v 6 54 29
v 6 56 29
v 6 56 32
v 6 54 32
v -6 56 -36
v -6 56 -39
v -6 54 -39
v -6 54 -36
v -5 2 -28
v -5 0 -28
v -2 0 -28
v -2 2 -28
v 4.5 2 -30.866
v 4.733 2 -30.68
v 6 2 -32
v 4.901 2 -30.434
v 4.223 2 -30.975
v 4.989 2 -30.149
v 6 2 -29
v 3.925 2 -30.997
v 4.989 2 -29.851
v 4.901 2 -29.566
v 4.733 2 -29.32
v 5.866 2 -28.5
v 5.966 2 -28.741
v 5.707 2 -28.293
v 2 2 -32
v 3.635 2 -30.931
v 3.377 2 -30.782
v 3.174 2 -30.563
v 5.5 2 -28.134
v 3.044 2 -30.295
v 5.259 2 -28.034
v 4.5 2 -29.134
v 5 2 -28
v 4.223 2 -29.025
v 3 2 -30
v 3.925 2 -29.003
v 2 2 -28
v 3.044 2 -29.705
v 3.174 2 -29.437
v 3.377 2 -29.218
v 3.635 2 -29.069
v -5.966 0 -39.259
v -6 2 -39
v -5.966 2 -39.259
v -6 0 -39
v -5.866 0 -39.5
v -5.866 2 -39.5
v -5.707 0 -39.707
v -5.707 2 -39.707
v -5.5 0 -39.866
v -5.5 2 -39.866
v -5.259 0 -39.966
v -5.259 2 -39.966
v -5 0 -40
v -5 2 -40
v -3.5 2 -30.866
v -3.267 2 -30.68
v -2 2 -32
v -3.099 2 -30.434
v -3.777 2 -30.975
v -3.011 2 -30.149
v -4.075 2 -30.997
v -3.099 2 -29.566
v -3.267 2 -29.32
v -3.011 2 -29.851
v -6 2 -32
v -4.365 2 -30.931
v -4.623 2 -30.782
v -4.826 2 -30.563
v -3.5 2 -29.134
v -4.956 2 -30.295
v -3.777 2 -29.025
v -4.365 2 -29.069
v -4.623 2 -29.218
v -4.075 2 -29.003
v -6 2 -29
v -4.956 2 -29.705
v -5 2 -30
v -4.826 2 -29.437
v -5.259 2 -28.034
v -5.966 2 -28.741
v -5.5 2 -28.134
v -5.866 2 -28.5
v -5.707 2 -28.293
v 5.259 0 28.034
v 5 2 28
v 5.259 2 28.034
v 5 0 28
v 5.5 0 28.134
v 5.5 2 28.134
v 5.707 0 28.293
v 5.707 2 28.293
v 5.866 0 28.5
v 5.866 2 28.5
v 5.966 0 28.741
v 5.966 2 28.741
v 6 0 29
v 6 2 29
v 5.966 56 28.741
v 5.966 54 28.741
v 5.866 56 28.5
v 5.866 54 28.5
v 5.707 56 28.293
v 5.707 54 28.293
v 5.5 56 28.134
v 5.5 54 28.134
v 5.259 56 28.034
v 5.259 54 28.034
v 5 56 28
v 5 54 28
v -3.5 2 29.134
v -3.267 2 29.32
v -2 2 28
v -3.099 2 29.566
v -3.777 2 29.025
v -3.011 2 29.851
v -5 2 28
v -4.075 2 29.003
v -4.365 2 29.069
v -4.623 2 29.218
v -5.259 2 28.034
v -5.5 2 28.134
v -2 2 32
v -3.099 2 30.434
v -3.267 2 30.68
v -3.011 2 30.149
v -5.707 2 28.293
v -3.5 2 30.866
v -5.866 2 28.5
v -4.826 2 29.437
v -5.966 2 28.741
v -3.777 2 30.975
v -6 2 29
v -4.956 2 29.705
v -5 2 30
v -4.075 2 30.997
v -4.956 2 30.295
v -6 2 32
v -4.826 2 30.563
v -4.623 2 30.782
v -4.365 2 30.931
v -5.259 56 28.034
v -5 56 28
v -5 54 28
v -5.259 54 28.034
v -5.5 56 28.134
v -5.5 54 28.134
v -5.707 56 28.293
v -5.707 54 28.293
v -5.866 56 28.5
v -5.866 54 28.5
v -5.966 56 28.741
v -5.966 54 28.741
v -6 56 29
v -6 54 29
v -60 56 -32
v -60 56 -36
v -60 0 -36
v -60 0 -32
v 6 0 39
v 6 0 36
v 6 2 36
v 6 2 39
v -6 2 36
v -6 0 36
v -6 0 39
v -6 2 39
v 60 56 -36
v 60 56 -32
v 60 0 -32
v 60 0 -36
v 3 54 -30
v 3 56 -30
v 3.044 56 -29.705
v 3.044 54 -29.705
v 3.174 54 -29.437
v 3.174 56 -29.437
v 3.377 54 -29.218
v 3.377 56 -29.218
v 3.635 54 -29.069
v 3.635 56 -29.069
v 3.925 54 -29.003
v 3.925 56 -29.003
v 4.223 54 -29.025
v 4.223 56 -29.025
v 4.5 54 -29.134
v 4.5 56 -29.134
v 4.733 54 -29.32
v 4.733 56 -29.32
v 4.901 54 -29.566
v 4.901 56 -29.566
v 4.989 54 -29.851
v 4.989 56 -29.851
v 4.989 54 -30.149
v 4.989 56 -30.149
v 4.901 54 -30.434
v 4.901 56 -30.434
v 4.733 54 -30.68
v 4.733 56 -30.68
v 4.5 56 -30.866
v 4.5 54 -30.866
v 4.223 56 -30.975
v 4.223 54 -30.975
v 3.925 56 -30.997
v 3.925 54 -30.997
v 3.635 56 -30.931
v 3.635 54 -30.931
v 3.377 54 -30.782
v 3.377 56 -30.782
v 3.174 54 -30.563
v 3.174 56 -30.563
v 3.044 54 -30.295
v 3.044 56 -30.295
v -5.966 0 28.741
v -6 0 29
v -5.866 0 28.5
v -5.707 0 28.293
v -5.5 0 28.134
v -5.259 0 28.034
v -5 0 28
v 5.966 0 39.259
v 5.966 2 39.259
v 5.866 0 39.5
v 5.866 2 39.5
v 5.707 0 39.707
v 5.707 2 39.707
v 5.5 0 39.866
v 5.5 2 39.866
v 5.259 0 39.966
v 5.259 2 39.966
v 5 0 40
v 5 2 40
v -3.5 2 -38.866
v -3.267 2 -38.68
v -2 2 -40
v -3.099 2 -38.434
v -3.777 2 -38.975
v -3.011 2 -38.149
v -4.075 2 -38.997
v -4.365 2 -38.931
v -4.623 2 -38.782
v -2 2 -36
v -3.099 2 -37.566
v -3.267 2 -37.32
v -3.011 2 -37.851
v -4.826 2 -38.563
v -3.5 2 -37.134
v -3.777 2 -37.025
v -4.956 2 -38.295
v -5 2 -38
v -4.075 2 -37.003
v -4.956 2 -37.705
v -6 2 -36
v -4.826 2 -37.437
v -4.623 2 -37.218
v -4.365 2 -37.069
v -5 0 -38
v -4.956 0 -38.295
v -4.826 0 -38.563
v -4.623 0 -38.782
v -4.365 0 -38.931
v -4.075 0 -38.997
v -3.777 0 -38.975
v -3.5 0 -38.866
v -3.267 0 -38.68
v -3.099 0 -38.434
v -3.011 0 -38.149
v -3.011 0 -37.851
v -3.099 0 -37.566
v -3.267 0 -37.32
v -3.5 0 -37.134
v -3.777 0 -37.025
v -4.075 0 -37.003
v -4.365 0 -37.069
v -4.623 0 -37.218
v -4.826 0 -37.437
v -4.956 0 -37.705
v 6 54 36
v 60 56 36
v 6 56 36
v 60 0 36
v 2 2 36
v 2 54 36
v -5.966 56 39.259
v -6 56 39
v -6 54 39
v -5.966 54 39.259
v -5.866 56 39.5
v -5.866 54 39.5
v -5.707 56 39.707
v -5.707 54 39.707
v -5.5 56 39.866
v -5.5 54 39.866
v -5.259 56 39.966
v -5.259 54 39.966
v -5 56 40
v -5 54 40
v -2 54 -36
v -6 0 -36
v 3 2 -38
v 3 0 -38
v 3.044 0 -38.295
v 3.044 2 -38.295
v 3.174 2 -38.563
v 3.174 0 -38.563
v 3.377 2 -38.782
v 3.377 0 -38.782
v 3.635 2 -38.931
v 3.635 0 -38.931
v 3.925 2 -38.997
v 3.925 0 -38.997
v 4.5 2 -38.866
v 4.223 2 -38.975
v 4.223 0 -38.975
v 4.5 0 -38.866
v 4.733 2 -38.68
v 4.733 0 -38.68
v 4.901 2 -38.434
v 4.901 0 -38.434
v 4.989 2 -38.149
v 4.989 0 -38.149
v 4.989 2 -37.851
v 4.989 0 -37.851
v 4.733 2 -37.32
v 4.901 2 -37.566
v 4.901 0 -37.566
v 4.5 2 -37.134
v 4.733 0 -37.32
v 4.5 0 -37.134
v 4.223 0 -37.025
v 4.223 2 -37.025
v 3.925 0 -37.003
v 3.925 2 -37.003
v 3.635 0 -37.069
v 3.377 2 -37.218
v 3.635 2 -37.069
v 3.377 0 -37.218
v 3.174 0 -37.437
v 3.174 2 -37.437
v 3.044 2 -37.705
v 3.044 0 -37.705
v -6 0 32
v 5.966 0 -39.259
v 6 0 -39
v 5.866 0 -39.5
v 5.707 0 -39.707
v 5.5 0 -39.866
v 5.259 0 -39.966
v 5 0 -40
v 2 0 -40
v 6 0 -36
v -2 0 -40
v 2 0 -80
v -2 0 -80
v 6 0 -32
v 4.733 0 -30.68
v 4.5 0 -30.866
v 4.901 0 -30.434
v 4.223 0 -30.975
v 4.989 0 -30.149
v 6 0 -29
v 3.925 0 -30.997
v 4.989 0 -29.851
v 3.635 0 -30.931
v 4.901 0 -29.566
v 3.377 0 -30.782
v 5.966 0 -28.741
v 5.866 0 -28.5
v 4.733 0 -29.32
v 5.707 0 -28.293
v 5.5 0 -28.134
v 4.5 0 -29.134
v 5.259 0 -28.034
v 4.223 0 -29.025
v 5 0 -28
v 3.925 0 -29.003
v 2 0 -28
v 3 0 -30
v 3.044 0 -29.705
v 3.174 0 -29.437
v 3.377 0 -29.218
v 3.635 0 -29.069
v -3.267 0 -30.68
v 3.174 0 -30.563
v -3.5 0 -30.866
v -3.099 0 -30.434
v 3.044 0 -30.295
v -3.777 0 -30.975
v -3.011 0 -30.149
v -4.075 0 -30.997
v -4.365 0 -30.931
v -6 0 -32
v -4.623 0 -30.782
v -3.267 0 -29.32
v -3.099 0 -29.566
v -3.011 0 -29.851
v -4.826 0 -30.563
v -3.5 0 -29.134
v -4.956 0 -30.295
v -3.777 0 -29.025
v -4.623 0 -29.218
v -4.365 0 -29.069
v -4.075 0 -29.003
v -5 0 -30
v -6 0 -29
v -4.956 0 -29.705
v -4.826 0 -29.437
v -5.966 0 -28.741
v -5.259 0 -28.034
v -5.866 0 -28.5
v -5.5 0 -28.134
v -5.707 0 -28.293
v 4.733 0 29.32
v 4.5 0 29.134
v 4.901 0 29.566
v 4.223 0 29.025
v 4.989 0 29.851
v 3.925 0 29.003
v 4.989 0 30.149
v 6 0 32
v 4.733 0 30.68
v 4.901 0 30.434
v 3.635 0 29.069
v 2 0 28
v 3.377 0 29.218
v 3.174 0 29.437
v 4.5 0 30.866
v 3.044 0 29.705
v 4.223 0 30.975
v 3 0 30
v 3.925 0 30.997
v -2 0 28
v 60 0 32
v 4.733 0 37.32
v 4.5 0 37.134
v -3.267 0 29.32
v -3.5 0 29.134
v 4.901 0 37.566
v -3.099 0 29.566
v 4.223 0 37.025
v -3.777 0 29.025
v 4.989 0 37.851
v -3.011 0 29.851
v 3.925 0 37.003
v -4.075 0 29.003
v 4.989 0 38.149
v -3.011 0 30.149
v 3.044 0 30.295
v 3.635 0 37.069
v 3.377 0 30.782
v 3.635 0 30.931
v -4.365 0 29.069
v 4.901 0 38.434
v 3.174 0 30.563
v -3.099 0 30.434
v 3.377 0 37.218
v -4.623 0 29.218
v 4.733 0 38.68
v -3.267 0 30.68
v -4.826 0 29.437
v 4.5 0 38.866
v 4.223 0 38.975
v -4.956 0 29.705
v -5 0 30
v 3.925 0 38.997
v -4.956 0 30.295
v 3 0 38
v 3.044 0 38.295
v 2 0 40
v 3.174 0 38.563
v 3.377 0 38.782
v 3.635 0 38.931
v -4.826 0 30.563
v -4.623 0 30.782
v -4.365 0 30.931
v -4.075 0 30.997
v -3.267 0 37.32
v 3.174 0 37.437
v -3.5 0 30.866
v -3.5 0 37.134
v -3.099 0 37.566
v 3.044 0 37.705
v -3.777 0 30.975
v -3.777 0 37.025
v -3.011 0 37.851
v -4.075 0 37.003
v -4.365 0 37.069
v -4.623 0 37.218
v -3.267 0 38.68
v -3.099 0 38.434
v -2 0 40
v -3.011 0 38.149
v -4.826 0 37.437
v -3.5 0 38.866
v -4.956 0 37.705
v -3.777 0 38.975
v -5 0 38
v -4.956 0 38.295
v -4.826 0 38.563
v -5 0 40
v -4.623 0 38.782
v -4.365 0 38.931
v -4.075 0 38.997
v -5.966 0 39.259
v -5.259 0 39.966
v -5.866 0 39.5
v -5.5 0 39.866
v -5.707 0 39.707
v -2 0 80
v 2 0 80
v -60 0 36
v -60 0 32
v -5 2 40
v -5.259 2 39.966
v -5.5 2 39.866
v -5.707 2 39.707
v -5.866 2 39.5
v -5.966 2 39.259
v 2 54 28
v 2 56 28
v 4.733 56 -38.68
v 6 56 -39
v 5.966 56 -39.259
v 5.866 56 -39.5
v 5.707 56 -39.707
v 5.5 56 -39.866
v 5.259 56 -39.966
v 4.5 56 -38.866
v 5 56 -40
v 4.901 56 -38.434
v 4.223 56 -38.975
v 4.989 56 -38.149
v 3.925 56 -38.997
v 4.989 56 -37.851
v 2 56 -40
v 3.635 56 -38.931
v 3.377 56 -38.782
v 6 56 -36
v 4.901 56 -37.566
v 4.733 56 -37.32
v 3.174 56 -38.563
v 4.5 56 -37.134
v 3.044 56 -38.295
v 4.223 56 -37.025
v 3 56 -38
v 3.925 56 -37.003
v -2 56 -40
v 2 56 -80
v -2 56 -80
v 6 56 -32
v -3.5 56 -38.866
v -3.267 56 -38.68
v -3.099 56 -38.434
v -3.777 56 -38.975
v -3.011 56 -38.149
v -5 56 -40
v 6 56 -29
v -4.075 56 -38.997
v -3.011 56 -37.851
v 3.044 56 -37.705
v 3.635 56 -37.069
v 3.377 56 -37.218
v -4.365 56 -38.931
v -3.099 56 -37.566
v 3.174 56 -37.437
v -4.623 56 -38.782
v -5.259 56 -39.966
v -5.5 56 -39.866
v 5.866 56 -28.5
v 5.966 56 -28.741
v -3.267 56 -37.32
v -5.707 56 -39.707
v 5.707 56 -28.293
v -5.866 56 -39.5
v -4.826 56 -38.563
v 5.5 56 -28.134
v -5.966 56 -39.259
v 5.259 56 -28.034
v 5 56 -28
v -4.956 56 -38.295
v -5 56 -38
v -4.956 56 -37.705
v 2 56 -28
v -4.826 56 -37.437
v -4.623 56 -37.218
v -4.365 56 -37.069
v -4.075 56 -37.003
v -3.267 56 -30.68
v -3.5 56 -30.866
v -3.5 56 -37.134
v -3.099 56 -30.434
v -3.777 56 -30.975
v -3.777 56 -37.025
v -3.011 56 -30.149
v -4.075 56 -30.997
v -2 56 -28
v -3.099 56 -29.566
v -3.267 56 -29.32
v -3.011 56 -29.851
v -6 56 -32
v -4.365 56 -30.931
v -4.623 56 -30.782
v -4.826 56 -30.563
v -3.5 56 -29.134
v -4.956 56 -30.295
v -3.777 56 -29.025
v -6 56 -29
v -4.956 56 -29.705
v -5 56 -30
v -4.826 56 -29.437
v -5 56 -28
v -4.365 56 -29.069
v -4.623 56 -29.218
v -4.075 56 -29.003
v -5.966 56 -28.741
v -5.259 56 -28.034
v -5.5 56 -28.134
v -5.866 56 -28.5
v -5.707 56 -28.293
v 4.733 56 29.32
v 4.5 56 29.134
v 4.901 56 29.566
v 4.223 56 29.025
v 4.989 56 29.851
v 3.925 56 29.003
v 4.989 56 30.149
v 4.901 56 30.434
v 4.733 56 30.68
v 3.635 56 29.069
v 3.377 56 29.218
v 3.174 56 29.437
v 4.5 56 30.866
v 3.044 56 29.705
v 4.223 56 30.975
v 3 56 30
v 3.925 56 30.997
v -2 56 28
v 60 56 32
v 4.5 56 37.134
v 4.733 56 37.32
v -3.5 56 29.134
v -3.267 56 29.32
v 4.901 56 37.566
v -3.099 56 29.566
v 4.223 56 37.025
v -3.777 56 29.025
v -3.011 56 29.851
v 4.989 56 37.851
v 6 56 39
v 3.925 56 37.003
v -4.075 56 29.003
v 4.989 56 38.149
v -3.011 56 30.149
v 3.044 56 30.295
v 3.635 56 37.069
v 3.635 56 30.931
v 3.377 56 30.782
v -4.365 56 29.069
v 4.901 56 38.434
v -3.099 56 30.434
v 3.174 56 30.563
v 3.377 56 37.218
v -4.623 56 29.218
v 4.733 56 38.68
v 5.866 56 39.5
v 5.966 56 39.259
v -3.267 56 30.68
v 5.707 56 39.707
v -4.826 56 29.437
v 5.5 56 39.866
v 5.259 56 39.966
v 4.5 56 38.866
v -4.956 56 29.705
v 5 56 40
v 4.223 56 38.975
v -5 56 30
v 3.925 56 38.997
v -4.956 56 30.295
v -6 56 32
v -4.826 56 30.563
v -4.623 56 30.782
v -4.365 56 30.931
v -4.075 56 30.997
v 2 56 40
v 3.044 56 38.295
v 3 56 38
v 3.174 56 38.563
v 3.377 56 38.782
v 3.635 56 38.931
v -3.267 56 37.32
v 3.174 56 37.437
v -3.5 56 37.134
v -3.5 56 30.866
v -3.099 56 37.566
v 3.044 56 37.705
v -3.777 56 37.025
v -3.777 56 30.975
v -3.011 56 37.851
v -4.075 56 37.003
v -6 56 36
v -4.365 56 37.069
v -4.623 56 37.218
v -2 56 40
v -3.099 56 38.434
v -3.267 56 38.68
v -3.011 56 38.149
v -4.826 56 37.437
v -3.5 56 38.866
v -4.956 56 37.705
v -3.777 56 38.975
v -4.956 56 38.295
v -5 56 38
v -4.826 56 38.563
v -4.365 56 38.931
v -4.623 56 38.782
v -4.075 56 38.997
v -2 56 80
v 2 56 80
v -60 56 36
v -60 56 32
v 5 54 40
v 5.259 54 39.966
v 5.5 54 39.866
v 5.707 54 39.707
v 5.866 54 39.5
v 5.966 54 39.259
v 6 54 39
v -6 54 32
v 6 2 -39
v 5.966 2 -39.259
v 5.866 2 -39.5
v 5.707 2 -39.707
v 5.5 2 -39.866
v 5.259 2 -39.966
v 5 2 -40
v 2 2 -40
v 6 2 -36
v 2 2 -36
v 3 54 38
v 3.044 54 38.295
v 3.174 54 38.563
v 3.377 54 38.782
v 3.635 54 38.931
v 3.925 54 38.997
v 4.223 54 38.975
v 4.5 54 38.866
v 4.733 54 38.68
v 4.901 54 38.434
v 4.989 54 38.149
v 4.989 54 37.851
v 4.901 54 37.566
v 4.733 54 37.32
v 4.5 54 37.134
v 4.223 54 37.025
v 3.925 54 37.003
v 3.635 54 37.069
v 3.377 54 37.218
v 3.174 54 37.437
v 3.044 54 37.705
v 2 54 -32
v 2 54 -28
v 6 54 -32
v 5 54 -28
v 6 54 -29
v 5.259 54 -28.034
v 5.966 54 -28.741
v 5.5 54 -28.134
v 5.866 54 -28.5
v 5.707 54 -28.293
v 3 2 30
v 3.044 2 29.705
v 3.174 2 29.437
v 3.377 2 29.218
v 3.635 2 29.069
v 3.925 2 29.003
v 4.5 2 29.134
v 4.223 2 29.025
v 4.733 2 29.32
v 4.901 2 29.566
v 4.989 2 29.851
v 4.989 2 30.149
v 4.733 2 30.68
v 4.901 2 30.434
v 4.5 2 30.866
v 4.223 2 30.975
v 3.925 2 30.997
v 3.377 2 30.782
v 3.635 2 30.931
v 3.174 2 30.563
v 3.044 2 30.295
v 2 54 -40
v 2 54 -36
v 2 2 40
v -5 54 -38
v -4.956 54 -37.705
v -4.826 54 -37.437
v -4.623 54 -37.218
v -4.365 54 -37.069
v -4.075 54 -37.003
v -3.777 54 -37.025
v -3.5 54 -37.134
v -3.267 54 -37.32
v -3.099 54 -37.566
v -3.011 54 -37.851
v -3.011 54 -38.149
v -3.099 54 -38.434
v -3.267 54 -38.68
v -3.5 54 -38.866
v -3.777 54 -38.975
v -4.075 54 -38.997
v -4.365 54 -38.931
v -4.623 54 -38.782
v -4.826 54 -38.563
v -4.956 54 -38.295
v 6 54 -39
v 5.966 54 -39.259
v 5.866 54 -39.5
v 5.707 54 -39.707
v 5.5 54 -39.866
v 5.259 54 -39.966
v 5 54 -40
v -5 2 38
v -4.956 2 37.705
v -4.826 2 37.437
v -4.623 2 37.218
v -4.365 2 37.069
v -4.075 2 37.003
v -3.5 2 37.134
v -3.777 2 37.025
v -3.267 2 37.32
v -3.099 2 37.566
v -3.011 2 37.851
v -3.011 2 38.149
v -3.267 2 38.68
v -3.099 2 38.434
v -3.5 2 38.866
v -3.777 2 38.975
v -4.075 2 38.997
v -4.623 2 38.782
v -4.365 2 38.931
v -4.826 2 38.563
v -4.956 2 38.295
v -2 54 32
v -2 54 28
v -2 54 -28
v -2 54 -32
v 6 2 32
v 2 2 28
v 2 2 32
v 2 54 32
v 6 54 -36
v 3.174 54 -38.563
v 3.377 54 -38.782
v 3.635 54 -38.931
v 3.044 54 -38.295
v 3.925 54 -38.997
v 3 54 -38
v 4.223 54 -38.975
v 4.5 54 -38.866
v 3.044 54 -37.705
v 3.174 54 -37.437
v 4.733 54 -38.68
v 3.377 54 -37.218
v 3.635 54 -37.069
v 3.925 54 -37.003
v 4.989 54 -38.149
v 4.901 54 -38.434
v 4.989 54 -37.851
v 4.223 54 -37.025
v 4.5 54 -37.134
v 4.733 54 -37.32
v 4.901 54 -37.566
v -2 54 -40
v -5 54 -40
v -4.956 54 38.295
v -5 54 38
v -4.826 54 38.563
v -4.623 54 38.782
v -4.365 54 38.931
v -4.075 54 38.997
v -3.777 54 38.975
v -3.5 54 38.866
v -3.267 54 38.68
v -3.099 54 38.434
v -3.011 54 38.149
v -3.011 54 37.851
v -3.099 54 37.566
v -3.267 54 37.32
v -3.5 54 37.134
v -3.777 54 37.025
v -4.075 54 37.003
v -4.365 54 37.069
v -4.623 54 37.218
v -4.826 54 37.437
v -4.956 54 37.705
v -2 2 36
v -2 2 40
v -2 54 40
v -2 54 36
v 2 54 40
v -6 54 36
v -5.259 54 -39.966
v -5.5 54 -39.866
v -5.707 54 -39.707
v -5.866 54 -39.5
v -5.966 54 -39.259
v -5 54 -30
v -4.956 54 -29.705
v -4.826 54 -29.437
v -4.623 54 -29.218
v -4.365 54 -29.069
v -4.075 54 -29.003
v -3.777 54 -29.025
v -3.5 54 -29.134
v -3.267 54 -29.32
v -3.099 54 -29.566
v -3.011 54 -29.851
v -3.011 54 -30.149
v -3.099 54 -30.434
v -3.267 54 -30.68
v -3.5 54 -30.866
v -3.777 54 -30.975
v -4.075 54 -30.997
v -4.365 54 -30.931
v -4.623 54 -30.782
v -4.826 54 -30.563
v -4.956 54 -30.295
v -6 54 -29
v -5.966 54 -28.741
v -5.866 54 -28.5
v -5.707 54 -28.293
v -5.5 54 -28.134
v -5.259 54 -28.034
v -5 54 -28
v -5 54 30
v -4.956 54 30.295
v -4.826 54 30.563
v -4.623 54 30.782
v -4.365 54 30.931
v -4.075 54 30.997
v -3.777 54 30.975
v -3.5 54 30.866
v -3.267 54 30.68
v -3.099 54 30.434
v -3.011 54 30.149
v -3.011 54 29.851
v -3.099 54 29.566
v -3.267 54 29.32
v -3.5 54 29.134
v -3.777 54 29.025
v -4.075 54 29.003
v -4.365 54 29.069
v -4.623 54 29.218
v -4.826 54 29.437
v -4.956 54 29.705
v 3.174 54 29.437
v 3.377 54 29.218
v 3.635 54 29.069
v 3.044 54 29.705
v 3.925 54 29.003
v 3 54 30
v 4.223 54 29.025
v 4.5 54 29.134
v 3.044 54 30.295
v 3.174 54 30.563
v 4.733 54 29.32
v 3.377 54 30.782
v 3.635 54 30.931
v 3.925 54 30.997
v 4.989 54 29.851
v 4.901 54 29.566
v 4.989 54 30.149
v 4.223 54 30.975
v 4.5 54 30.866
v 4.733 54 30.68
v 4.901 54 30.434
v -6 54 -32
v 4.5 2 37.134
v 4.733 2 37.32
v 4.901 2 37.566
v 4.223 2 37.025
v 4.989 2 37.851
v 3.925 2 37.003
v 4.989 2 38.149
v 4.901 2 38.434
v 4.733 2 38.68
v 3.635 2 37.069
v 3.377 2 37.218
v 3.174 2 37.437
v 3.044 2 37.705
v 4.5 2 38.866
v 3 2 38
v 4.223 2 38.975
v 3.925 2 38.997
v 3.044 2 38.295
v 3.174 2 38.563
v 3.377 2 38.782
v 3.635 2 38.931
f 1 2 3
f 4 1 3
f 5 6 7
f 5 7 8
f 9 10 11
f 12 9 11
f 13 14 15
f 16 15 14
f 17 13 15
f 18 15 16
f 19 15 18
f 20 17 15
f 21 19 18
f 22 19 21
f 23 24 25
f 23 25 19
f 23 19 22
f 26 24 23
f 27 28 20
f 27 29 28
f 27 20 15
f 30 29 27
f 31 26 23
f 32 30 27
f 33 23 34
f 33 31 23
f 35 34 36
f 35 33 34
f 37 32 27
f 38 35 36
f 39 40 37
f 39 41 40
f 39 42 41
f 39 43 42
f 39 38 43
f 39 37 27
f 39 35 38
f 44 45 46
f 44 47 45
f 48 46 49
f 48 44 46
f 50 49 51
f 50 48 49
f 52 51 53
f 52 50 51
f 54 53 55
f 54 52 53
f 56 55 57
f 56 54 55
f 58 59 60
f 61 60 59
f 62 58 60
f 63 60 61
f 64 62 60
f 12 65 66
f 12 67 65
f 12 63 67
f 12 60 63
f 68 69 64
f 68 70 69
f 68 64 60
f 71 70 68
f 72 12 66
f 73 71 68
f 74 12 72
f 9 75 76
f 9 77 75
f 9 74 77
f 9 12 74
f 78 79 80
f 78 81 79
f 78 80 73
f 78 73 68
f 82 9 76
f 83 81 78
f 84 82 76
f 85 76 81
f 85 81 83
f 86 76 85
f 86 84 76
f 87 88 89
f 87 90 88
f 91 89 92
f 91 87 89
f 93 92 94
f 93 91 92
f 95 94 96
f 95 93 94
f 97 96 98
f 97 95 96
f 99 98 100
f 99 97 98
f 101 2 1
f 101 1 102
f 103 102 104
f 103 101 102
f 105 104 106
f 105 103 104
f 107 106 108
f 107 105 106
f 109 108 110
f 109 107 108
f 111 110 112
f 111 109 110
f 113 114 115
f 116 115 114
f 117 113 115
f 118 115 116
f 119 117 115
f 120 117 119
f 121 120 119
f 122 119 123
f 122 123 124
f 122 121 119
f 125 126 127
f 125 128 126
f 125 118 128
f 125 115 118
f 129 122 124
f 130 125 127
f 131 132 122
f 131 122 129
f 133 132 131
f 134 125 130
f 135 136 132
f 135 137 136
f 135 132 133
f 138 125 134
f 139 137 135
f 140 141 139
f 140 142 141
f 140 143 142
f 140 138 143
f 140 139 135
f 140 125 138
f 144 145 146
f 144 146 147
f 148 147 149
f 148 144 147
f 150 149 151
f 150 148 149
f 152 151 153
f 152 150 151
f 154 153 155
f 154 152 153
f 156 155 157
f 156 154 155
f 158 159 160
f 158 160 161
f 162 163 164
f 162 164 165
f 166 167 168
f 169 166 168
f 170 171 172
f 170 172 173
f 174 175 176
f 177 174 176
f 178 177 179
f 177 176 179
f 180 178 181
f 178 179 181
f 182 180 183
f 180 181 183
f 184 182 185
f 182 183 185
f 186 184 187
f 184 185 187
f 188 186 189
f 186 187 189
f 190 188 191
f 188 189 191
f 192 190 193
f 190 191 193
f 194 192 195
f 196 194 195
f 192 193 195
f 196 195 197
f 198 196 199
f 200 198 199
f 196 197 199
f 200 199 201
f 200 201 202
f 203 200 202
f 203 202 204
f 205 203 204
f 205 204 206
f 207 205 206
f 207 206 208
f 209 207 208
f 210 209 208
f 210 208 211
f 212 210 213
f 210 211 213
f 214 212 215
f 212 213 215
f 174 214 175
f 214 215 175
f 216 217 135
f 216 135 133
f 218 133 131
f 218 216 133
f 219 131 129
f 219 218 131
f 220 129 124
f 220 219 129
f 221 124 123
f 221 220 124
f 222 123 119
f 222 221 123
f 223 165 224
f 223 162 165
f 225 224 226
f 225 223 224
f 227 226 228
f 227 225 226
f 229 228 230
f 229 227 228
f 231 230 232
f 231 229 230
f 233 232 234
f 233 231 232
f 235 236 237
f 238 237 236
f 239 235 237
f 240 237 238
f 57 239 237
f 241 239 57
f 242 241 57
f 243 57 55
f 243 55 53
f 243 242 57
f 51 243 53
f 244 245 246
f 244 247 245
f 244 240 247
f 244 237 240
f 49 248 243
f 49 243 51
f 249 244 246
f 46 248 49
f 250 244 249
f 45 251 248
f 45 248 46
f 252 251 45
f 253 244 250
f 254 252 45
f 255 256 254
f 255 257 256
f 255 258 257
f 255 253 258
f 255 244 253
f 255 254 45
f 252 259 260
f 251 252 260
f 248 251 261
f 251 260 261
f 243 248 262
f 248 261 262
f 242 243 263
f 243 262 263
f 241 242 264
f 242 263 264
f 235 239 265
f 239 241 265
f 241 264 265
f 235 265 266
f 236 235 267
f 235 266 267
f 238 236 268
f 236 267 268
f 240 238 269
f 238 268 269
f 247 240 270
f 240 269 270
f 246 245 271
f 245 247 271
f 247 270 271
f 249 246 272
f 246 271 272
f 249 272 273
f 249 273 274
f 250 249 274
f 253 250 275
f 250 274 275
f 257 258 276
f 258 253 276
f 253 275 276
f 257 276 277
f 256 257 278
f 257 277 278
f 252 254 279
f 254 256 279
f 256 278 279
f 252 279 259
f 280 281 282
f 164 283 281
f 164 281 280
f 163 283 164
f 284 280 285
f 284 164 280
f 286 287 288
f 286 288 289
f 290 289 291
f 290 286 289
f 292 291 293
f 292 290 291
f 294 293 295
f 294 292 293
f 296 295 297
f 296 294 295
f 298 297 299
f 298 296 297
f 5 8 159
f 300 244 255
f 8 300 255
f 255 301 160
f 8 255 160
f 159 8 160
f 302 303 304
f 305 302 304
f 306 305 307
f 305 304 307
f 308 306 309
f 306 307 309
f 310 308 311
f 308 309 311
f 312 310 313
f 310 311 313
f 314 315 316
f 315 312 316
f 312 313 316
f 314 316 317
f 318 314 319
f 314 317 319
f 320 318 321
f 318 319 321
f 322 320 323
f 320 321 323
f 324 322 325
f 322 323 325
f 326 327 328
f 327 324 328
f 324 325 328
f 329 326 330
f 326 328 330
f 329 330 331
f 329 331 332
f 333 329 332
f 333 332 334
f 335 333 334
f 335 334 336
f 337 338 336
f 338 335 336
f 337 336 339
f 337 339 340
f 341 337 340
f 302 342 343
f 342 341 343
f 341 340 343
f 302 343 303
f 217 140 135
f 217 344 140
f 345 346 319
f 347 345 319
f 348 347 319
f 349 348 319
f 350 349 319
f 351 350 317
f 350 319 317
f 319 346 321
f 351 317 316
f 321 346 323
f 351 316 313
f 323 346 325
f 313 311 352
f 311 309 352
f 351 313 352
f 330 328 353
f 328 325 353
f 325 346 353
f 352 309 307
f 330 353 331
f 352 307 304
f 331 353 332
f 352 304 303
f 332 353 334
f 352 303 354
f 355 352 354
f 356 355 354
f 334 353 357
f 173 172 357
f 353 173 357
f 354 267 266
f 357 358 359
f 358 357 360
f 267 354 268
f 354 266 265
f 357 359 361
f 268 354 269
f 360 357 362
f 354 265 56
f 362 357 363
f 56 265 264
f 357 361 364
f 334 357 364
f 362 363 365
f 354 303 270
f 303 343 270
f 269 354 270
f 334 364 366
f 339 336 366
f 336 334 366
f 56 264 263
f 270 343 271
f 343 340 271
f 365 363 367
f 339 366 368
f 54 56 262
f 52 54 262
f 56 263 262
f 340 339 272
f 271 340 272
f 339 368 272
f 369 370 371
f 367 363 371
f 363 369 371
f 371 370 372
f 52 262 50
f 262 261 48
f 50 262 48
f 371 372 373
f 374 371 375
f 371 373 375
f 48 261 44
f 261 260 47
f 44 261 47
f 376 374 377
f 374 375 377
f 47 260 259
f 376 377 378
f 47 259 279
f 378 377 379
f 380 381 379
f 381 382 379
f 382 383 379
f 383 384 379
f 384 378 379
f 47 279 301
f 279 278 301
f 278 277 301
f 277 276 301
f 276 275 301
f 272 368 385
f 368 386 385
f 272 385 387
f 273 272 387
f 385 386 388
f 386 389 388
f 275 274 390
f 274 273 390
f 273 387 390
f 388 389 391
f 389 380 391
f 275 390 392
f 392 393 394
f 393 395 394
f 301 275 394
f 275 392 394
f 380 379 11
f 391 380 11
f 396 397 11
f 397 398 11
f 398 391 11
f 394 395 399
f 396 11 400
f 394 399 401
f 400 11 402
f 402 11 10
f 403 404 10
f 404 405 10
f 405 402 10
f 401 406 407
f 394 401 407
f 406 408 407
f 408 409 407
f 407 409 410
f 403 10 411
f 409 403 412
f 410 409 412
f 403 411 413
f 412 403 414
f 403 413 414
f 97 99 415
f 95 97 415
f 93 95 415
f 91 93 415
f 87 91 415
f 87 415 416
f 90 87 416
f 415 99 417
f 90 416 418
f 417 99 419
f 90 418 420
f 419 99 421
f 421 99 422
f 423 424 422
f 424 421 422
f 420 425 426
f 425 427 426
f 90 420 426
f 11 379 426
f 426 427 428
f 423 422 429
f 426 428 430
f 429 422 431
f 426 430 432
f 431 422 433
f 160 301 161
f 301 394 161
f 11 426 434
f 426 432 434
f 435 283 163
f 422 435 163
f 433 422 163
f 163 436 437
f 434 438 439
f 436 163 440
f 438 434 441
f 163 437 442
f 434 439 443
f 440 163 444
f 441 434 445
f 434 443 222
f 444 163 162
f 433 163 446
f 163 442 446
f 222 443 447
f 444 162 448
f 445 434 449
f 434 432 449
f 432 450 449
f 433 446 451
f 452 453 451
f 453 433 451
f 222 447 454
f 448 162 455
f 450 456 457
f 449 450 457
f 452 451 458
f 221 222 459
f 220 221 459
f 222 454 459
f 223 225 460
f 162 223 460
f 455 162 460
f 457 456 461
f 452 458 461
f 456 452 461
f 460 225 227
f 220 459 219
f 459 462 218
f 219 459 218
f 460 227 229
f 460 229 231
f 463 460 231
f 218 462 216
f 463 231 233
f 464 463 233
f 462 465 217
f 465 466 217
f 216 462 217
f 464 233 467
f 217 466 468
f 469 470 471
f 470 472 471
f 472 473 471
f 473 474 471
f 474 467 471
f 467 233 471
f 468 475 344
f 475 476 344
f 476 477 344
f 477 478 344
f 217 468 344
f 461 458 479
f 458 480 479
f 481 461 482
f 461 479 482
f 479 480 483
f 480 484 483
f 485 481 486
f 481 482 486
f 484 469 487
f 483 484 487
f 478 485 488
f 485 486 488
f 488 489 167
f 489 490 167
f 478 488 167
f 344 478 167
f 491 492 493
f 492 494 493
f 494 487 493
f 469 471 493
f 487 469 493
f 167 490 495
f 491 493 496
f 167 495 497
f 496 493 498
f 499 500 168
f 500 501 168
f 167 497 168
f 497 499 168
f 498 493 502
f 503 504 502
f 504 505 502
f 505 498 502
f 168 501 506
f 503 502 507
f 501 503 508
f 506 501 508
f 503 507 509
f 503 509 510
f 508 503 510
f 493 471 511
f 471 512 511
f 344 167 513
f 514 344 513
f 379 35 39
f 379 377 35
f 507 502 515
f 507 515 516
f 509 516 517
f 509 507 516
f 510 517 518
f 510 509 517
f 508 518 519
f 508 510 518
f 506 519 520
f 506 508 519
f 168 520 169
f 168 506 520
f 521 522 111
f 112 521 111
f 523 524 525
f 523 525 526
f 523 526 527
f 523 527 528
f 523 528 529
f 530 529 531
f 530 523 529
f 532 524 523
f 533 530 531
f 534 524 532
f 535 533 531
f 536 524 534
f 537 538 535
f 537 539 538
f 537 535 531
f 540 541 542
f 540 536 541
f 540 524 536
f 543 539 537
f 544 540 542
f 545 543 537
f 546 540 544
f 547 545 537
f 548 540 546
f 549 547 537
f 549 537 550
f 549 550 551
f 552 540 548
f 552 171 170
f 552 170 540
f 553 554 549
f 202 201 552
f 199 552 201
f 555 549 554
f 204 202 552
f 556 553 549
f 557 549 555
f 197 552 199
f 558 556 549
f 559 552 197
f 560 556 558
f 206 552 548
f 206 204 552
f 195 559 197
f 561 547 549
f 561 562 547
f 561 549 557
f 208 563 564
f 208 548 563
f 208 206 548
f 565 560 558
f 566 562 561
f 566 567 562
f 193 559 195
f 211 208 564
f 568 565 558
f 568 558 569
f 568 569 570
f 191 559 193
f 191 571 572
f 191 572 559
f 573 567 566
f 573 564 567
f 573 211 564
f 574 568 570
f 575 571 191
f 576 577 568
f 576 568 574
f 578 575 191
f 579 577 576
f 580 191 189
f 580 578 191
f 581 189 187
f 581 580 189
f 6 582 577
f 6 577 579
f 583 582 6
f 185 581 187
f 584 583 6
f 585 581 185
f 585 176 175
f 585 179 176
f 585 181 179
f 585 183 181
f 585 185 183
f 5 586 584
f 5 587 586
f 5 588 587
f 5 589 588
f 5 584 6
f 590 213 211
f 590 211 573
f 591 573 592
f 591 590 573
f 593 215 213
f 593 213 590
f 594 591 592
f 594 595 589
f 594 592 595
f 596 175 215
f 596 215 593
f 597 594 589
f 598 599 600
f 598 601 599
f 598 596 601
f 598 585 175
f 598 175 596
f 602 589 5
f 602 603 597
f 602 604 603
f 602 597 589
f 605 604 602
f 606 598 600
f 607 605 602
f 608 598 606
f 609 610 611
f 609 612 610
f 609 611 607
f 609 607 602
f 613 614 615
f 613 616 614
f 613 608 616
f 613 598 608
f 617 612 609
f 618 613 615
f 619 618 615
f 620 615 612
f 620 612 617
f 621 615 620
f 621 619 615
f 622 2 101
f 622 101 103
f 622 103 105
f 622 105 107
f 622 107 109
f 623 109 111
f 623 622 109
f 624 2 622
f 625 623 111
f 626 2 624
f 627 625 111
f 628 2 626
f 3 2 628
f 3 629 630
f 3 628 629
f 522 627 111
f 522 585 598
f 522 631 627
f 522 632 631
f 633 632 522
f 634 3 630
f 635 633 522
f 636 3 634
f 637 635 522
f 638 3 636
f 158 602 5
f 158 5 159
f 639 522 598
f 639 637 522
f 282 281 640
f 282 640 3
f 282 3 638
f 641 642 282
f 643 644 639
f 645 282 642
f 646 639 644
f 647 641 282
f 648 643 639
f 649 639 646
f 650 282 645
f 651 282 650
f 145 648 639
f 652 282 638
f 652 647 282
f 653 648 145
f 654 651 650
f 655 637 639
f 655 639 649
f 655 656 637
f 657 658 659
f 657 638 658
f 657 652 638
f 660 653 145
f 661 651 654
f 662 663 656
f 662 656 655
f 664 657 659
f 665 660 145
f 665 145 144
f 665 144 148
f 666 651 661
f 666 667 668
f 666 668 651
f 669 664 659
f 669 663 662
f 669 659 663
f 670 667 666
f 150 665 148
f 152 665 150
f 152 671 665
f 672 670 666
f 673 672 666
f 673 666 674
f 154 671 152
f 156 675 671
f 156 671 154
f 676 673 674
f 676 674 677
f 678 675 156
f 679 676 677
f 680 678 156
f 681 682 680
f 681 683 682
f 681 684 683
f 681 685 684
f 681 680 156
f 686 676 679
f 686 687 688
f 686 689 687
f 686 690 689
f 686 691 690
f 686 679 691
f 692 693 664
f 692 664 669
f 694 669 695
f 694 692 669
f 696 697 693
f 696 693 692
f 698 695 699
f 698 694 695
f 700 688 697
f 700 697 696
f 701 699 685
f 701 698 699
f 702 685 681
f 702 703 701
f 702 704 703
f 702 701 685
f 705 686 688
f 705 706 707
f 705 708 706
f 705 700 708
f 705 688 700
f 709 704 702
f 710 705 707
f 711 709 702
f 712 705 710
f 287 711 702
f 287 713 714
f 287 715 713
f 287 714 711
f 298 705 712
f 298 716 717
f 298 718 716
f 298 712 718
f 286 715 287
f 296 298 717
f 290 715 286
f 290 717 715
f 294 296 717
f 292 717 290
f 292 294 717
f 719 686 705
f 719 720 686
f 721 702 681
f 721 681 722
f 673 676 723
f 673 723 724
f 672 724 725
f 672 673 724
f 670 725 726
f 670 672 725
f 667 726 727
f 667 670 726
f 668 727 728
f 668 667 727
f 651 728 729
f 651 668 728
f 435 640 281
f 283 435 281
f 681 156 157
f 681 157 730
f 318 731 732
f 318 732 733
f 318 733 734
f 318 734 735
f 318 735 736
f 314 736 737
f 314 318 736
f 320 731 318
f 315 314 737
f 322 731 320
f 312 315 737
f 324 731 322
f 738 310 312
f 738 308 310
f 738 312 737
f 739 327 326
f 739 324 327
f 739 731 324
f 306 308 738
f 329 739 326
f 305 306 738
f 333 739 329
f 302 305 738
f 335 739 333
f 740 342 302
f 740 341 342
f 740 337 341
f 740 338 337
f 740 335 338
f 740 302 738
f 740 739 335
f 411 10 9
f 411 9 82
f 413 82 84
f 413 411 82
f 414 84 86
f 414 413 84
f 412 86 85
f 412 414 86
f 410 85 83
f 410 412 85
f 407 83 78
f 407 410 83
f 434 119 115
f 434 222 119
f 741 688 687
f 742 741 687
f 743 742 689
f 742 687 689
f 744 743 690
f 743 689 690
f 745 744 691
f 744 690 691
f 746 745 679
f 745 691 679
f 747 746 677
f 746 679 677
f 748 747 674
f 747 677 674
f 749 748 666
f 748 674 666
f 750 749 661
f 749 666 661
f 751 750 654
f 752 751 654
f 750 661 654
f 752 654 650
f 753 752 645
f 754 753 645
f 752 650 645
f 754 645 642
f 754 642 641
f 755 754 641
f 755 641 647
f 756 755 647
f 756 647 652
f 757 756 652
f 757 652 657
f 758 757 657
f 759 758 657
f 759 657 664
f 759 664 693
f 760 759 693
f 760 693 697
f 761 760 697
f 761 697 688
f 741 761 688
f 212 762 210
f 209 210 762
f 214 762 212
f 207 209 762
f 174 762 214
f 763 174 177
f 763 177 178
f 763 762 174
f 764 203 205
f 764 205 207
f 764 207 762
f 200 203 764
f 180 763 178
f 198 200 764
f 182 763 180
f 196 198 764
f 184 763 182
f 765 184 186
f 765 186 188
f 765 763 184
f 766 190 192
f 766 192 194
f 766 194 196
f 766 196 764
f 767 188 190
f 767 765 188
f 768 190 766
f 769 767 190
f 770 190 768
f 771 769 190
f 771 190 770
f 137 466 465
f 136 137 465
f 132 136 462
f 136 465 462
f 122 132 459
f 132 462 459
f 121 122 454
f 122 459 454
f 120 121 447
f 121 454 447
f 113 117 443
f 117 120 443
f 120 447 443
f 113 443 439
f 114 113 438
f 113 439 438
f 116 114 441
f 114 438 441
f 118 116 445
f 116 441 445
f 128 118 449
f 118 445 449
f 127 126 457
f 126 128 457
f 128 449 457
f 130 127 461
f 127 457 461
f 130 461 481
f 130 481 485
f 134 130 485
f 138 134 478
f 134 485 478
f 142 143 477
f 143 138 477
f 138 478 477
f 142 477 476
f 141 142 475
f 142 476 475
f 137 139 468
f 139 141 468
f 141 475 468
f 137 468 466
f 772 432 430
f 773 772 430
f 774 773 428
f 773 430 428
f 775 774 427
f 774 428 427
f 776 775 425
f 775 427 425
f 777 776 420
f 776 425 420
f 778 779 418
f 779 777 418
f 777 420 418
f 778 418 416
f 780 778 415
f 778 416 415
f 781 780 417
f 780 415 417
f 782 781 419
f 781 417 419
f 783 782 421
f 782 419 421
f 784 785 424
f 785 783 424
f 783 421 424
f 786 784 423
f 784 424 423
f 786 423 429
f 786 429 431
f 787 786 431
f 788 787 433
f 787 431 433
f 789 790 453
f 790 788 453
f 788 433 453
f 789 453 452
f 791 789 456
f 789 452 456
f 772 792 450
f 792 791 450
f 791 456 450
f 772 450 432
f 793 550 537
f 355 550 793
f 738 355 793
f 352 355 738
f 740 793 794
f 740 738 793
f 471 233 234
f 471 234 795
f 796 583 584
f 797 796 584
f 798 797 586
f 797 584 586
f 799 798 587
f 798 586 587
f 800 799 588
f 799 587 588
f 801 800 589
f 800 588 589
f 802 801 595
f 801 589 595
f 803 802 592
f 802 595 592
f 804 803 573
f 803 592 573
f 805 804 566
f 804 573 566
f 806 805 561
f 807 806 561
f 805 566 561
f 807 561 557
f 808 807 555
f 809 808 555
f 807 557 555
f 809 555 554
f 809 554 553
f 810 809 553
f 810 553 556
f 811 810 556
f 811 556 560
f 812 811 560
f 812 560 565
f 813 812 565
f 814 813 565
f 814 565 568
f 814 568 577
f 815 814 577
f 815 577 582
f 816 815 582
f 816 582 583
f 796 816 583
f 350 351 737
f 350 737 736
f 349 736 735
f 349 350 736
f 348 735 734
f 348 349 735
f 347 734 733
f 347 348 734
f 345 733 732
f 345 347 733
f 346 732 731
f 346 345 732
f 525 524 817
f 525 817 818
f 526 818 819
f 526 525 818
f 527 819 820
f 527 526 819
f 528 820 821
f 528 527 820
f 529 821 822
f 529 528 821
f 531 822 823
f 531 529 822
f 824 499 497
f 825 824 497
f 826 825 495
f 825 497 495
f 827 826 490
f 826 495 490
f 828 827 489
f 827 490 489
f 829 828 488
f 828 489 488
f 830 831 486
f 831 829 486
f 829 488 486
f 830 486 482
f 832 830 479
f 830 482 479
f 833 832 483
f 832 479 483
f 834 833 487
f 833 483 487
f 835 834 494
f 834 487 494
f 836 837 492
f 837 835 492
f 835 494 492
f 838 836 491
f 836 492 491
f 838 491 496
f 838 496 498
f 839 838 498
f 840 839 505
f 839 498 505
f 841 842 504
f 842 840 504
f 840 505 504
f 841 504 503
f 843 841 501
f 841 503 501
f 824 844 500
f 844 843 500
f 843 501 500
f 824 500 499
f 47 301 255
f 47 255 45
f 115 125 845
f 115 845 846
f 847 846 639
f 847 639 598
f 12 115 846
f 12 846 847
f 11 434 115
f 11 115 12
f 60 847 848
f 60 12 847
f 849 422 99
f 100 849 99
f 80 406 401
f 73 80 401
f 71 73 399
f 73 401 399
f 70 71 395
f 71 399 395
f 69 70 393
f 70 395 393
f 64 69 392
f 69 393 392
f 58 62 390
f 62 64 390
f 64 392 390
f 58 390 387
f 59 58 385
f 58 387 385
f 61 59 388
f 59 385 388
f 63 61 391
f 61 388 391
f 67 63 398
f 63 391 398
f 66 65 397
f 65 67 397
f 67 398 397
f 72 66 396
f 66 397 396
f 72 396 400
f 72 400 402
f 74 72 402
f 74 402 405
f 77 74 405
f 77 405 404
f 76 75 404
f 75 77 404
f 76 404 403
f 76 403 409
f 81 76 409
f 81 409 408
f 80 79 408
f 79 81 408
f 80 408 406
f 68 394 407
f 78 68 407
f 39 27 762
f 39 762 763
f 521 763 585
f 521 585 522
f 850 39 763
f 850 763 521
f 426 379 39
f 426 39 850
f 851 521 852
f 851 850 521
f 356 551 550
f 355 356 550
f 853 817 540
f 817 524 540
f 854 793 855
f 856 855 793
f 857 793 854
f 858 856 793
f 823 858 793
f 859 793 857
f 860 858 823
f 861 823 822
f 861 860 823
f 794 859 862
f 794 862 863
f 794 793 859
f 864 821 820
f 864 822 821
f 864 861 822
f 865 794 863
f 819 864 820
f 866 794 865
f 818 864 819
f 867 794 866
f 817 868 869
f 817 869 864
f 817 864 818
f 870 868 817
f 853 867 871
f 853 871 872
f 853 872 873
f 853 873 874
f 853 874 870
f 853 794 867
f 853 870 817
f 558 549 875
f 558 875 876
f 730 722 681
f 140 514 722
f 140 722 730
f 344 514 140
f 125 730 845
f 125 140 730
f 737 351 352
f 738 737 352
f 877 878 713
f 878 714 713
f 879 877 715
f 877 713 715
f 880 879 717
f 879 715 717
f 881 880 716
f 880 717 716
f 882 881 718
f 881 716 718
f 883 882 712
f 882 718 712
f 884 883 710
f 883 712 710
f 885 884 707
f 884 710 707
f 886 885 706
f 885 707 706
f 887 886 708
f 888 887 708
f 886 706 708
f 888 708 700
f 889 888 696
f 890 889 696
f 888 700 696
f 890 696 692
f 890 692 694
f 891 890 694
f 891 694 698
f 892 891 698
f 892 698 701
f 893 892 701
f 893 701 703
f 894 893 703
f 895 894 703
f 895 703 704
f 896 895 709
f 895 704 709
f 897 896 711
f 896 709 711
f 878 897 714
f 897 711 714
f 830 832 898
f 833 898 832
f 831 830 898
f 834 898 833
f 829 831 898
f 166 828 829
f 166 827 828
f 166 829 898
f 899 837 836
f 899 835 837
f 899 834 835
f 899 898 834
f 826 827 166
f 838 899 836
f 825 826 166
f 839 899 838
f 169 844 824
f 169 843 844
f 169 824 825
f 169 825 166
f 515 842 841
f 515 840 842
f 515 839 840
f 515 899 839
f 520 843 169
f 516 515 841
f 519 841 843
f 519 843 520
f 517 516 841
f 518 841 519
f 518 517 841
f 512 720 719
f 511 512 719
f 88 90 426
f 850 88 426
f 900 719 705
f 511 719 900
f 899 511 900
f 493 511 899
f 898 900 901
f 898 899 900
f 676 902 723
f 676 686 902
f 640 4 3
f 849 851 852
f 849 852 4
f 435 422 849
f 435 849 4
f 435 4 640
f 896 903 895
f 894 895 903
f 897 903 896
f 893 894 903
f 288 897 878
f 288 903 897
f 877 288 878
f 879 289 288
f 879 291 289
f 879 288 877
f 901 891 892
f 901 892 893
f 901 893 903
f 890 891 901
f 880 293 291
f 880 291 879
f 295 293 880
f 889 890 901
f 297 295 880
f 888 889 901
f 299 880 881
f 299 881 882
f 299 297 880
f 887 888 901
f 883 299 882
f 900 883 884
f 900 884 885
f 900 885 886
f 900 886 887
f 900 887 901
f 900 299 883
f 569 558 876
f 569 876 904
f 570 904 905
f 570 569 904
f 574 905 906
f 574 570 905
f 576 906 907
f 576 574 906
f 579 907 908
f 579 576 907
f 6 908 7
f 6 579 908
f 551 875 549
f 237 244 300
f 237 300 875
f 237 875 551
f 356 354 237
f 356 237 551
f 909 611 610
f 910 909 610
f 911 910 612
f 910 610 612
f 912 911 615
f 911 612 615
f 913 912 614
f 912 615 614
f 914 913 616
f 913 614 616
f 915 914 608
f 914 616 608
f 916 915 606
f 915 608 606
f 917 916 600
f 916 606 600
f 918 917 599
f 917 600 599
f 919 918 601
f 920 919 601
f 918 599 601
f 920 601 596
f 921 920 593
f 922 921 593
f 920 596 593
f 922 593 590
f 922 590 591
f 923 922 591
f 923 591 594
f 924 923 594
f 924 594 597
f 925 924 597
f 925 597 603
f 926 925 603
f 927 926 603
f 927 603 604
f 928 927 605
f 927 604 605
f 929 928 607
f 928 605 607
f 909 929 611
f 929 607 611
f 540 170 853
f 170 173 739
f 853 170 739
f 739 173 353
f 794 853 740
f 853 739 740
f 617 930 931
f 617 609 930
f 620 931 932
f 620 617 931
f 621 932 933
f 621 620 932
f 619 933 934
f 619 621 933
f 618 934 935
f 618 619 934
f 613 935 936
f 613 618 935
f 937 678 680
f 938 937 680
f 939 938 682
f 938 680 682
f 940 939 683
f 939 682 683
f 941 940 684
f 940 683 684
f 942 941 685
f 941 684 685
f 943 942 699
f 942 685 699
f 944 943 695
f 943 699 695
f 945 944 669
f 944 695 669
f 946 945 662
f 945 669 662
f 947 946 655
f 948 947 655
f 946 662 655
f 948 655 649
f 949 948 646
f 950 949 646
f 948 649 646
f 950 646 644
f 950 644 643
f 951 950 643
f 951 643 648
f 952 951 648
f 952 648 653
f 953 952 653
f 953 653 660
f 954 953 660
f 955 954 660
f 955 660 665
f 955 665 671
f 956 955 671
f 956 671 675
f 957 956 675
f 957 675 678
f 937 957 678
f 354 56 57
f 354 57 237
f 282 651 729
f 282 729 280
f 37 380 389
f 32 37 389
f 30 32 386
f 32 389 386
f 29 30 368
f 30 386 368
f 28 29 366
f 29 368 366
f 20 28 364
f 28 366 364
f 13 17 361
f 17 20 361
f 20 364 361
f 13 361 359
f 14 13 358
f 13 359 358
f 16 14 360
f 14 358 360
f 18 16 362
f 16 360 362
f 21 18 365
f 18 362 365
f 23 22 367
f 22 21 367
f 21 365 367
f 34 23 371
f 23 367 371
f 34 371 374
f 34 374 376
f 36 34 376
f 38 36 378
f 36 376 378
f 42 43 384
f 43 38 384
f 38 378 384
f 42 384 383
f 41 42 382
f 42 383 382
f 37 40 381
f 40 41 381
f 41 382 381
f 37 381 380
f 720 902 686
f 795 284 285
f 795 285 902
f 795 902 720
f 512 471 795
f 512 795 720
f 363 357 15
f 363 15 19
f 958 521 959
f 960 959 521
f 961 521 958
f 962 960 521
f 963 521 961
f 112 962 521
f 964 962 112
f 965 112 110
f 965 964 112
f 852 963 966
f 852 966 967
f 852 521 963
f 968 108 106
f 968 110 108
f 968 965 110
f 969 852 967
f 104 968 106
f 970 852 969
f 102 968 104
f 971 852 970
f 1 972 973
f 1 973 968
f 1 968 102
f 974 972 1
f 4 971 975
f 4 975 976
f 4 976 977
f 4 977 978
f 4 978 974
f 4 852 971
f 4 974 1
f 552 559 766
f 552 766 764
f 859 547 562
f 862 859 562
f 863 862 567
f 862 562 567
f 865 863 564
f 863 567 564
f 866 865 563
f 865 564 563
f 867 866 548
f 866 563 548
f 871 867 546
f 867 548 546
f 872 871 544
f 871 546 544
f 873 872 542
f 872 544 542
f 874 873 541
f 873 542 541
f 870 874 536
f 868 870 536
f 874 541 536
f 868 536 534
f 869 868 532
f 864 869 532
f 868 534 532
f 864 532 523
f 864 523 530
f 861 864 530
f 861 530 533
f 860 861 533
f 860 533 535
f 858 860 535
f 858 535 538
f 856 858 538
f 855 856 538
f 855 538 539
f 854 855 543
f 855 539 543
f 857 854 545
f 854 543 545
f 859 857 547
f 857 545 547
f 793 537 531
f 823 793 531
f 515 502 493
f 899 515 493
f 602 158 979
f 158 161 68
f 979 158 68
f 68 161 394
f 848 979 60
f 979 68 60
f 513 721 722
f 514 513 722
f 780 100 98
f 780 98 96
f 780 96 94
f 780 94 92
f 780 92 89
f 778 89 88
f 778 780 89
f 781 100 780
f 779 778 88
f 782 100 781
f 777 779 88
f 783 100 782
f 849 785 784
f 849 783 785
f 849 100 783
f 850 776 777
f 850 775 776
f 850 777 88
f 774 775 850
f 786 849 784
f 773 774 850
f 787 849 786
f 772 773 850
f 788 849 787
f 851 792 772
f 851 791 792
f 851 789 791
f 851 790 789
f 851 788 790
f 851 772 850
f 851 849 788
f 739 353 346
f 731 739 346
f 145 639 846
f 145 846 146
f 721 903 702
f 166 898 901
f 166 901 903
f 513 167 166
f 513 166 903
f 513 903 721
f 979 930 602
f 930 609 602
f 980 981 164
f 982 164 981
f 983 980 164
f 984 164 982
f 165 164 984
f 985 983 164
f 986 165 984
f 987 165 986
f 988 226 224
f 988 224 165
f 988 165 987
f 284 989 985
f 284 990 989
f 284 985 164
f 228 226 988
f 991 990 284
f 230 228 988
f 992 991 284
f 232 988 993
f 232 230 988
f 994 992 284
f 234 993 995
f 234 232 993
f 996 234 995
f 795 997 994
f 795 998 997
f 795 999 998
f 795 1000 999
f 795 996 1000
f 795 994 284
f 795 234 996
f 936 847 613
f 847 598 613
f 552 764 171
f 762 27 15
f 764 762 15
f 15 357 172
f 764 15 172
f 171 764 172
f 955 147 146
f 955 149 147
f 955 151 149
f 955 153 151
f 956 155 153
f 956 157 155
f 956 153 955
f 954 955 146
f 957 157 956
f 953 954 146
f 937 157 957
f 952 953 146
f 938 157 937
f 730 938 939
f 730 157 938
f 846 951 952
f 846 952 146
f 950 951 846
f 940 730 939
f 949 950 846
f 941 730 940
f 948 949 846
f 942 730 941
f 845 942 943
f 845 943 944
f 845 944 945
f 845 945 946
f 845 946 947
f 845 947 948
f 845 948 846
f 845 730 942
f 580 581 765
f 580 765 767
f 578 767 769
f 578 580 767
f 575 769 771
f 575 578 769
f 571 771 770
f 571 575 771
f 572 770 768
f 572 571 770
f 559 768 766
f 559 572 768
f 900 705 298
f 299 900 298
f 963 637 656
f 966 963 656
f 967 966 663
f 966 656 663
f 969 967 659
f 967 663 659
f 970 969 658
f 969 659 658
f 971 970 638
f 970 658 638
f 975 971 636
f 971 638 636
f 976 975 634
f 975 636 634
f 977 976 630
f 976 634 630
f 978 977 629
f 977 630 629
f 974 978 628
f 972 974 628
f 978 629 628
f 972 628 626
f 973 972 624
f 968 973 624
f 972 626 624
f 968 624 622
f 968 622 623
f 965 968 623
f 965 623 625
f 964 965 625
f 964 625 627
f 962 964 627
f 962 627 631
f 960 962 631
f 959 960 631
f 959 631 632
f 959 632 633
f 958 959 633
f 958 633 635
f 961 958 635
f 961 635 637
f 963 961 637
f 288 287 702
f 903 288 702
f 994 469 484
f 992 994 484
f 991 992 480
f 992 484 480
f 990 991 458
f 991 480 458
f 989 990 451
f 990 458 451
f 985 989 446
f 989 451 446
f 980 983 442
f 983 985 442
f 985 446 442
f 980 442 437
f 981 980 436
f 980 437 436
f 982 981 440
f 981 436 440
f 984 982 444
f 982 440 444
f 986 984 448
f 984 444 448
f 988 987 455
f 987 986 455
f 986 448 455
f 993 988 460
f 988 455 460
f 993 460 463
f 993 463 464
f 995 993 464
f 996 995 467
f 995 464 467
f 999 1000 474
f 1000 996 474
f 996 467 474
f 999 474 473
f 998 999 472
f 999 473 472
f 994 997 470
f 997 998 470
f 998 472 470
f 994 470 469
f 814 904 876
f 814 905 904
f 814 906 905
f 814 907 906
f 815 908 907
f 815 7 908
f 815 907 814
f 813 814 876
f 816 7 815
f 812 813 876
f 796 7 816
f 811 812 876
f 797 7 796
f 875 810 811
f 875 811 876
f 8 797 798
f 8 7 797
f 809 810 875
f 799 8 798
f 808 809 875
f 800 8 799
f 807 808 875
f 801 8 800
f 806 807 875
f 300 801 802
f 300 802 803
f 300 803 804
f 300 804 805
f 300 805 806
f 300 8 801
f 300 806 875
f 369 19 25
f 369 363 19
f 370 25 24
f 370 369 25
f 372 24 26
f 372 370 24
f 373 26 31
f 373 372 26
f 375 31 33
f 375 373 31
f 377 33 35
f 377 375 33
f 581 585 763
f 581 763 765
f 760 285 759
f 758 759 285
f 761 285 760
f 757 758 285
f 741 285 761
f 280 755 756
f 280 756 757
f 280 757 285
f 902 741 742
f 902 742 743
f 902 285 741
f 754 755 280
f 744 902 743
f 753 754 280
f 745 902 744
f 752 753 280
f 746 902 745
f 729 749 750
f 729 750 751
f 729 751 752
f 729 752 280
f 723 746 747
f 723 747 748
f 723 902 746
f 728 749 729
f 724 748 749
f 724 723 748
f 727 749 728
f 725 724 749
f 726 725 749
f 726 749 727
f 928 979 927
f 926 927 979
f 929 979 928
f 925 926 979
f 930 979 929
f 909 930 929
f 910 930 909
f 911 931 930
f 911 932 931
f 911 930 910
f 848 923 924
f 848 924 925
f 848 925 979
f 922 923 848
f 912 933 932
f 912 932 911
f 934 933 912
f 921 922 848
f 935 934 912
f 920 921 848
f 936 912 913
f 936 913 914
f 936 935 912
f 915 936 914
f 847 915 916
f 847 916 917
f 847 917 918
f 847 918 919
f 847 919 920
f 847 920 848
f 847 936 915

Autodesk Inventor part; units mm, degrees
ref_plane "YZ Plane" through (0, 0, 0) normal (1, 0, 0) x (0, 1, 0)
ref_plane "XY Plane" through (0, 0, 0) normal (0, 0, 1) x (1, 0, 0)
sketch "Эскиз1" plane through (0, 0, 0) normal (0, 1, 0) x (-1, 0, 0)
  line L0 (-2, 80) -> (2, 80)
  line L1 (2, 80) -> (2, -80)
  line L2 (2, -80) -> (-2, -80)
  line L3 (-2, -80) -> (-2, 80)
  line L4 (60, 32) -> (-60, 32)
  line L5 (-60, 32) -> (-60, 36)
  line L6 (-60, 36) -> (60, 36)
  line L7 (60, 36) -> (60, 32)
  line L8 (60, -32) -> (-60, -32)
  line L9 (-60, -32) -> (-60, -36)
  line L10 (-60, -36) -> (60, -36)
  line L11 (60, -36) -> (60, -32)
  line L12 (60, 32) -> (60, -32) construction
  line L13 (2, -80) -> (2, -80)
  line L14 (2, -80) -> (-2, -80)
  point P0 (0, 0)
  point P1 (0, -32)
  point P2 (60, 0)
  point P3 (0, -80)
  point P4 (2, 0)
  dimension "d1" = 120
  dimension "d3" = 4
  dimension "d4" = 4
  dimension "d5" = 4
  dimension "d26" = 32
  dimension "d27" = 32
  dimension "d28" = 80
  dimension "d29" = 80
  dimension "d32" = 44
extrude "Выдавливание1" add sketch "Эскиз1" along normal blind 56
ref_plane "РабПлоскость1" through (0, 28, 0) normal (0, 1, 0) x (-1, 0, 0)
sketch "Эскиз2" plane through (0, 0, 0) normal (0, 1, 0) x (-1, 0, 0)
  line L0 (-2, 36) -> (-2, 80) construction
  line L1 (-2, 80) -> (2, 80) construction
  line L2 (2, 80) -> (2, 36) construction
  line L3 (2, 36) -> (60, 36) construction
  line L4 (60, 36) -> (60, 32) construction
  line L5 (60, 32) -> (2, 32) construction
  line L6 (2, 32) -> (2, -32) construction
  line L7 (60, -32) -> (2, -32) construction
  line L8 (60, -36) -> (60, -32) construction
  line L9 (2, -36) -> (60, -36) construction
  line L10 (2, -36) -> (2, -80) construction
  line L11 (2, -80) -> (-2, -80) construction
  line L12 (-2, -80) -> (-2, -36) construction
  line L13 (-60, -36) -> (-2, -36) construction
  line L14 (-60, -32) -> (-60, -36) construction
  line L15 (-2, -32) -> (-60, -32) construction
  line L16 (-2, -32) -> (-2, 32) construction
  line L17 (-2, 32) -> (-60, 32) construction
  line L18 (-60, 32) -> (-60, 36) construction
  line L19 (-60, 36) -> (-2, 36) construction
  line L20 (-2, 32) -> (-6, 32)
  line L21 (-6, 32) -> (-6, 29)
  line L22 (-5, 28) -> (-2, 28)
  line L23 (-2, 28) -> (-2, 32)
  circle A0 centre (-4, 30) radius 1
  arc A1 (-6, 29) -> (-5, 28) centre (-5, 29) ccw
  line L24 (-2, -36) -> (-6, -36)
  line L25 (-6, -36) -> (-6, -39)
  line L26 (-5, -40) -> (-2, -40)
  line L27 (-2, -40) -> (-2, -36)
  circle A2 centre (-4, -38) radius 1
  arc A3 (-6, -39) -> (-5, -40) centre (-5, -39) ccw
  line L28 (-60, 34) -> (60, 34) construction
  line L29 (-60, -34) -> (60, -34) construction
  line L30 (0, 80) -> (0, -80) construction
  line L31 (-2, 36) -> (-6, 36)
  line L32 (-6, 36) -> (-6, 39)
  line L33 (-5, 40) -> (-2, 40)
  line L34 (-2, 40) -> (-2, 36)
  circle A4 centre (-4, 38) radius 1
  arc A5 (-5, 40) -> (-6, 39) centre (-5, 39) ccw
  line L35 (2, 32) -> (6, 32)
  line L36 (6, 32) -> (6, 29)
  line L37 (5, 28) -> (2, 28)
  line L38 (2, 28) -> (2, 32)
  circle A6 centre (4, 30) radius 1
  arc A7 (5, 28) -> (6, 29) centre (5, 29) ccw
  arc A8 (6, 39) -> (5, 40) centre (5, 39) ccw
  line L39 (5, 40) -> (2, 40)
  line L40 (2, 40) -> (2, 36)
  line L41 (6, 36) -> (6, 39)
  line L42 (2, 36) -> (6, 36)
  circle A9 centre (4, 38) radius 1
  line L43 (-2, -28) -> (-2, -32)
  line L44 (-2, -32) -> (-6, -32)
  circle A10 centre (-4, -30) radius 1
  line L45 (-6, -32) -> (-6, -29)
  arc A11 (-5, -28) -> (-6, -29) centre (-5, -29) ccw
  line L46 (-5, -28) -> (-2, -28)
  line L47 (2, -40) -> (2, -36)
  line L48 (2, -36) -> (6, -36)
  circle A12 centre (4, -38) radius 1
  line L49 (6, -36) -> (6, -39)
  arc A13 (5, -40) -> (6, -39) centre (5, -39) ccw
  line L50 (5, -40) -> (2, -40)
  line L51 (2, -28) -> (2, -32)
  line L52 (2, -32) -> (6, -32)
  line L53 (6, -32) -> (6, -29)
  line L54 (5, -28) -> (2, -28)
  arc A14 (6, -29) -> (5, -28) centre (5, -29) ccw
  circle A15 centre (4, -30) radius 1
  point P0 (0, 0)
  point P1 (-6, 28)
  point P2 (-6, -40)
  point P3 (-6, 40)
  point P4 (6, 28)
  point P5 (6, 40)
  point P6 (-6, -28)
  point P7 (2, -32)
  point P8 (6, -40)
  point P9 (6, -28)
  dimension "d11" = 4
  dimension "d12" = 4
  dimension "d13" = 2
  dimension "d15" = 1
  dimension "d16" = 2
  dimension "d17" = 2
  dimension "d18" = 4
  dimension "d19" = 4
  dimension "d20" = 2
  dimension "d21" = 1
  dimension "d22" = 2
  dimension "d23" = 2
extrude "Выдавливание2" add sketch "Эскиз2" along normal blind 2
mirror "Зеркальное отражение1" about plane through (0, 28, 0) normal (0, 1, 0) of "Выдавливание2"
extrude "Выдавливание3" add sketch "Эскиз1" along normal up to surface (56 mm away) contours L0 L1 L6 L3 | L6 L1 L4 L3 | L4 L1 L8 L3 | L8 L1 L10 L3 | L10 L1 L2 L3
properties part number "крепление-стенки" material "Пластик АБС"
